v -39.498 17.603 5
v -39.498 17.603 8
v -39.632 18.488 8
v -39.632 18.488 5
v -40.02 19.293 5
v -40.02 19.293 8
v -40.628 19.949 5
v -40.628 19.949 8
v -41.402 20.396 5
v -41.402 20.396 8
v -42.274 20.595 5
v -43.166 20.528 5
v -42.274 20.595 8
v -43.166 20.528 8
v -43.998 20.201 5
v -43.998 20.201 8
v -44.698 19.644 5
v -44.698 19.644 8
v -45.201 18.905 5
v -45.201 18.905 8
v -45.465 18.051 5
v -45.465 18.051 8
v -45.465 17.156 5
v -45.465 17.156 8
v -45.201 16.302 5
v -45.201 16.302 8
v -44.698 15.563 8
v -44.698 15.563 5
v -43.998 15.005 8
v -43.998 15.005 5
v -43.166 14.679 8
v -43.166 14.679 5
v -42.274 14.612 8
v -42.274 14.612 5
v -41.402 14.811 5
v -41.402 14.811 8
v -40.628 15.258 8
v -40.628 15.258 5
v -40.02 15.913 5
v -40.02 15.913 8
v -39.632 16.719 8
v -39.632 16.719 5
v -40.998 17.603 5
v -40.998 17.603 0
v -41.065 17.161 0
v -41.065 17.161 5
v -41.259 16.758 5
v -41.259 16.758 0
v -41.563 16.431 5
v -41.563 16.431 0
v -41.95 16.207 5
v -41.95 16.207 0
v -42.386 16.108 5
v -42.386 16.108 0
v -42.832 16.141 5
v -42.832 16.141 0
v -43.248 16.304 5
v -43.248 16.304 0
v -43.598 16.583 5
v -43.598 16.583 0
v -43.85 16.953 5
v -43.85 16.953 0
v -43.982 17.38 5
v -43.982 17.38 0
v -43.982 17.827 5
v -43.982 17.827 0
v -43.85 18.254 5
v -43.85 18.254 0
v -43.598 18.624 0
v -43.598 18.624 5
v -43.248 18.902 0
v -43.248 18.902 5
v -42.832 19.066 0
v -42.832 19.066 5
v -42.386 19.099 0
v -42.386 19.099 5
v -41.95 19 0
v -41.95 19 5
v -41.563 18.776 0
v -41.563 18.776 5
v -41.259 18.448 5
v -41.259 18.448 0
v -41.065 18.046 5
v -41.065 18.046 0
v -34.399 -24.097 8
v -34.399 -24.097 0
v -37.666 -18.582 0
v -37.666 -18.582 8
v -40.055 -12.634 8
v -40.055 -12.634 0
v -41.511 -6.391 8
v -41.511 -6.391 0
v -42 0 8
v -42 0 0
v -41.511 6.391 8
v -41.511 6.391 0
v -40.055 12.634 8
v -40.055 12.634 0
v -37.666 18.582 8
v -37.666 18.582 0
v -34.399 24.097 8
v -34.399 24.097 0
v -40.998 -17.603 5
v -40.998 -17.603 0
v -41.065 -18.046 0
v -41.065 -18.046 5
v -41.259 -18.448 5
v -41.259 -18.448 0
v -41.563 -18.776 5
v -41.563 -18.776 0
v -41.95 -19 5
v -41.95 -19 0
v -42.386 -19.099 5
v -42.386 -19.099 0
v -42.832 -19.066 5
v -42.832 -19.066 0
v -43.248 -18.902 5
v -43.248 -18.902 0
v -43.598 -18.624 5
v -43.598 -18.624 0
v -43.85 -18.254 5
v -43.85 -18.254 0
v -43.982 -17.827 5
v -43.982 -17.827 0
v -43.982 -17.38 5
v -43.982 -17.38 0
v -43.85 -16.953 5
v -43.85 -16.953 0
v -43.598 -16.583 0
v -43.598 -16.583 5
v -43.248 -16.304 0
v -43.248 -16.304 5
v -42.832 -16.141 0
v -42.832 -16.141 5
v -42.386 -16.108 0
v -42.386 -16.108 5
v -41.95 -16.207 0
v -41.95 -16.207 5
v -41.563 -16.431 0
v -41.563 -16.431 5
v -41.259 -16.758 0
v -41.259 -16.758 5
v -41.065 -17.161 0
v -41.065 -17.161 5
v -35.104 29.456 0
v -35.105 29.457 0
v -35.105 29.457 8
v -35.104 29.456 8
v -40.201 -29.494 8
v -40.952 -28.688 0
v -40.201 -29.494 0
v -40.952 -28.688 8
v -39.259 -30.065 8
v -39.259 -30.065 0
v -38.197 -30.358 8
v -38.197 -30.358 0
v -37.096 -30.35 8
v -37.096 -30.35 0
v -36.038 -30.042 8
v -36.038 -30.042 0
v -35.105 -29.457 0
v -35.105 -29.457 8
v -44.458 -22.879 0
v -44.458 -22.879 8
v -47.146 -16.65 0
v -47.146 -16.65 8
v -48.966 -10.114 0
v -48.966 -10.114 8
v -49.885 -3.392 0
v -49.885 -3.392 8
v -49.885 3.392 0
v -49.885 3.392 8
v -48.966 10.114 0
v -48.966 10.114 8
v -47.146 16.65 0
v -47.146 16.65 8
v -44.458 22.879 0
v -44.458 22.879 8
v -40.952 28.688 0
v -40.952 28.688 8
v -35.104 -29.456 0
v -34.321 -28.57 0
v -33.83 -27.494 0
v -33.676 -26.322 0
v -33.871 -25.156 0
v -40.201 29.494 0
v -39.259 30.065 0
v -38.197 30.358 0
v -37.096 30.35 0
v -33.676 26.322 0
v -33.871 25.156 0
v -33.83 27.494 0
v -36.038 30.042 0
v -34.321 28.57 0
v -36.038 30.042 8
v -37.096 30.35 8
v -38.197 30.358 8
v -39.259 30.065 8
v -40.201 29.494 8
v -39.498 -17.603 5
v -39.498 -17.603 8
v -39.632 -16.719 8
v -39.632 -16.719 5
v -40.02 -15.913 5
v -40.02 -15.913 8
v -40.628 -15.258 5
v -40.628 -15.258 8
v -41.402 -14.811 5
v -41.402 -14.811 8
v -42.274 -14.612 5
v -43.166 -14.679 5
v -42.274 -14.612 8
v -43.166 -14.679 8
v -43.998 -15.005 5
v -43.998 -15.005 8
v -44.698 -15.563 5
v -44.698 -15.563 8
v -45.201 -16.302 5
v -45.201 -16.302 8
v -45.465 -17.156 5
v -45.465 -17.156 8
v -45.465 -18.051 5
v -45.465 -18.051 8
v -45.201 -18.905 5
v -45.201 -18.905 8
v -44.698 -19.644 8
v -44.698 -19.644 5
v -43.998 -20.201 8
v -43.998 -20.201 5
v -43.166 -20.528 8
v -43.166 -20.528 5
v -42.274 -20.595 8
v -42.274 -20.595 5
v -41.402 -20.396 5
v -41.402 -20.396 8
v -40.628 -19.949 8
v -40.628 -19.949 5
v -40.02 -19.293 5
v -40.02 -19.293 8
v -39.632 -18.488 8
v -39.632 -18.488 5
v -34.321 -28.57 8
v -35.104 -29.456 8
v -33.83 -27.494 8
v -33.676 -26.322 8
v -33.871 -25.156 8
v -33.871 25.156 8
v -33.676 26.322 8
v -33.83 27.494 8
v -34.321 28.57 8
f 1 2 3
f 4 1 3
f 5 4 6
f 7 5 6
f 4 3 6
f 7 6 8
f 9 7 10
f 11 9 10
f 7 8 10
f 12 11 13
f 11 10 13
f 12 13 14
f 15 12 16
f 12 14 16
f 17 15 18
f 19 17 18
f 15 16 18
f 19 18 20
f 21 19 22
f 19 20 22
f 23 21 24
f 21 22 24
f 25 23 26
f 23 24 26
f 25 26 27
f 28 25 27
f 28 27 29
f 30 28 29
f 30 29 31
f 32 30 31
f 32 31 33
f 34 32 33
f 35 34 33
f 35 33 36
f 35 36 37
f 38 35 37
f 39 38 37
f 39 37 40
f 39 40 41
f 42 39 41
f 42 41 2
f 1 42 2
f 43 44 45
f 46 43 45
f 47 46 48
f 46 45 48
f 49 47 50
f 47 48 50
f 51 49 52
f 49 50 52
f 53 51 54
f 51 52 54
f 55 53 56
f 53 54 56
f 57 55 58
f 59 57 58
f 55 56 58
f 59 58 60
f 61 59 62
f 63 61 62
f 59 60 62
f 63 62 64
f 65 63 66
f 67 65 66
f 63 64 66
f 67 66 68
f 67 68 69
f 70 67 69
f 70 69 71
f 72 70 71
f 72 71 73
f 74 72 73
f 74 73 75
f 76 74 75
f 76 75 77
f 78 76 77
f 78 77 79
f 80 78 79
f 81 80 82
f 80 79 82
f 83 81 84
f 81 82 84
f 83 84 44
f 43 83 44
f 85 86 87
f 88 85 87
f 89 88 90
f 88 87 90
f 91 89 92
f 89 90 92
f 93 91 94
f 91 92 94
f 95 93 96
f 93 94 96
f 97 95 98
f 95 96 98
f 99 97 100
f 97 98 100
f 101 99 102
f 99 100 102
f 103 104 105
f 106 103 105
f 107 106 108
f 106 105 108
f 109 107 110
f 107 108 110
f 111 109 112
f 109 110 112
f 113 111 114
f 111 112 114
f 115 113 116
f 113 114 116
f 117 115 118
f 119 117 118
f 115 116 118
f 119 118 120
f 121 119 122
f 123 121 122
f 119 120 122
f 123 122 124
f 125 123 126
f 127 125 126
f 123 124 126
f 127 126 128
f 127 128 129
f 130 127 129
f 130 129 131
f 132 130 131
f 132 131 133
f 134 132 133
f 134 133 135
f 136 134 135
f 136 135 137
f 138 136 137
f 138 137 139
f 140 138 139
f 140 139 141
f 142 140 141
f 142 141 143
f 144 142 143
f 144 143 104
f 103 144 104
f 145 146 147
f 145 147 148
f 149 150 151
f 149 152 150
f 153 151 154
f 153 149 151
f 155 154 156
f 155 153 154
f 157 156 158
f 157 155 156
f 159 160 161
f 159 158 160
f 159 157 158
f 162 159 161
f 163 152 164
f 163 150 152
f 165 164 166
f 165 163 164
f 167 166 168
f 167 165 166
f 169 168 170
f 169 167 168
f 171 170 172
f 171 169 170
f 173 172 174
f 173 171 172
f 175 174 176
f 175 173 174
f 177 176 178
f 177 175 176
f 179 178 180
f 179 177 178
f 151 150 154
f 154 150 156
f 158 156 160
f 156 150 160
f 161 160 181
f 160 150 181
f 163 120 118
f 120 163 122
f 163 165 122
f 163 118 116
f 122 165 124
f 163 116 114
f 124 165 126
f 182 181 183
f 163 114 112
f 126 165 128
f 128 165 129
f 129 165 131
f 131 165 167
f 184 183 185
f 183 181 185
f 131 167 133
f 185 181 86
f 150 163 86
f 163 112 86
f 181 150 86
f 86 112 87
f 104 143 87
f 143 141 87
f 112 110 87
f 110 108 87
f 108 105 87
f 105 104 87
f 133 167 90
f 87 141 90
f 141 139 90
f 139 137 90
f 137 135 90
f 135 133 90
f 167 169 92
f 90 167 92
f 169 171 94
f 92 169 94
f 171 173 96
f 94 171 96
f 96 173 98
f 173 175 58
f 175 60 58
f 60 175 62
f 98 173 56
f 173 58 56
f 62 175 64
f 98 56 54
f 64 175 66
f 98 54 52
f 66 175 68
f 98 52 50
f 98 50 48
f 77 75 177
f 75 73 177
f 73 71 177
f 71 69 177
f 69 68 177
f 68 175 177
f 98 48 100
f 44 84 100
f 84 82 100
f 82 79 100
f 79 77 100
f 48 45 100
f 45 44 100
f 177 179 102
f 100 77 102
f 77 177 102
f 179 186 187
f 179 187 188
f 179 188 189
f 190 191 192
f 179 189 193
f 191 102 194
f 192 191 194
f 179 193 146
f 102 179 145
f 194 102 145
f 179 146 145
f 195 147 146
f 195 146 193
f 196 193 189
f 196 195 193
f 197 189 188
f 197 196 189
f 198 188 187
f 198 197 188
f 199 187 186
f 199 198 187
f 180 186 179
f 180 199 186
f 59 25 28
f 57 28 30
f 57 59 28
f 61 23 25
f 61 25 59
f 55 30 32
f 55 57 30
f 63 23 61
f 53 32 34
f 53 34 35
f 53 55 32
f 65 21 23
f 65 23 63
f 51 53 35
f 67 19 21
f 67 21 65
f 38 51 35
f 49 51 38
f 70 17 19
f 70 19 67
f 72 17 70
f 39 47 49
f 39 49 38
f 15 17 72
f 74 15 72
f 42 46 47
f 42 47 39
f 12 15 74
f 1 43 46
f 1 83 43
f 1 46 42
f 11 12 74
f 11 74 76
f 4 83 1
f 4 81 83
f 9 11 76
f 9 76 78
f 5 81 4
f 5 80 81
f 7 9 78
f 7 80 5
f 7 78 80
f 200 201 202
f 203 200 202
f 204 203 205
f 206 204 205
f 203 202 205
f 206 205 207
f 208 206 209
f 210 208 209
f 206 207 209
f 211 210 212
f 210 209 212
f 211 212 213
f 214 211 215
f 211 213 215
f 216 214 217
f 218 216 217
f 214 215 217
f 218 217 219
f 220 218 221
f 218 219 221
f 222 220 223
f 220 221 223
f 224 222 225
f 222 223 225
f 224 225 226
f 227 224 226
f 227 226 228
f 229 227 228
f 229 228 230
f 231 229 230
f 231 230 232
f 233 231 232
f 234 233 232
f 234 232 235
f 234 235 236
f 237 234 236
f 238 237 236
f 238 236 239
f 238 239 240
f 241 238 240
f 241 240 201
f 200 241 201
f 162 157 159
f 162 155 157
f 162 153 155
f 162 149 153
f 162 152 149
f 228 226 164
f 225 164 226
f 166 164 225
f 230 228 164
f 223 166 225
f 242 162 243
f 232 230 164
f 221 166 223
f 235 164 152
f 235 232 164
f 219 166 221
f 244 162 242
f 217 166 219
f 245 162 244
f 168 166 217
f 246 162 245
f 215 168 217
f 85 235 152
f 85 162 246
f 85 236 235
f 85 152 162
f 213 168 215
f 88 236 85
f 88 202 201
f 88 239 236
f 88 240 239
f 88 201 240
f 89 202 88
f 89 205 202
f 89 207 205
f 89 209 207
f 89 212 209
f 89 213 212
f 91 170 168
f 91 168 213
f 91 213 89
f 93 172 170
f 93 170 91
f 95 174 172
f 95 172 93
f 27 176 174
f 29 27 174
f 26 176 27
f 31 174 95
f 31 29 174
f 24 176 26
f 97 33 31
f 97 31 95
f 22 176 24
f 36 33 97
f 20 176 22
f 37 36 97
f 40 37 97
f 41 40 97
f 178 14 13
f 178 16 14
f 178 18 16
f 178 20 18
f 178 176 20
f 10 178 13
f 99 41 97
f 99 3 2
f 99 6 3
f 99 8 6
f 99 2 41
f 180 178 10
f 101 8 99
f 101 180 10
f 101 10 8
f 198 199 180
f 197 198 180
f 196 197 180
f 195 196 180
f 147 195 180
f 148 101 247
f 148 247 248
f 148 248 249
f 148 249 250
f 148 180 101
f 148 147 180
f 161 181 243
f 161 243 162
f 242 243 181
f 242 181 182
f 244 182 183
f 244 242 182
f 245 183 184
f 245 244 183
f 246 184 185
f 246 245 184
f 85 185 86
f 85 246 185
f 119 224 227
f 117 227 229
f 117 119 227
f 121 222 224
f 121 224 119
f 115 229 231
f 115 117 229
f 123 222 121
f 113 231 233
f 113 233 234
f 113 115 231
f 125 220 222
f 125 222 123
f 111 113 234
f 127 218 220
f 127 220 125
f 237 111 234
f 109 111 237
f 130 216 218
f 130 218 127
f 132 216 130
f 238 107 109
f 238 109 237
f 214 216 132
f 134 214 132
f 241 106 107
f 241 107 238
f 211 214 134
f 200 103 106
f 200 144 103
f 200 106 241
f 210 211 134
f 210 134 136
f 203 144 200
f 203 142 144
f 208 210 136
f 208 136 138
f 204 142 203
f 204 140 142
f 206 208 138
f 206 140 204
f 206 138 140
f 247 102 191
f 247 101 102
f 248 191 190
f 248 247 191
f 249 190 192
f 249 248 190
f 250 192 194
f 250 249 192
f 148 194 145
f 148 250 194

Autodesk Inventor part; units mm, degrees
ref_plane "YZ Plane" through (0, 0, 0) normal (1, 0, 0) x (0, 1, 0)
ref_plane "XZ Plane" through (0, 0, 0) normal (0, 1, 0) x (-1, 0, 0)
ref_plane "XY Plane" through (0, 0, 0) normal (0, 0, 1) x (1, 0, 0)
sketch "スケッチ1" plane through (0, 0, 0) normal (0, 0, 1) x (1, 0, 0)
  circle A0 centre (0, 0) radius 46
  circle A1 centre (0, 0) radius 50
  circle A2 centre (0, 0) radius 42
  line L0 (0, 0) -> (0, 54.8528)
  line L1 (0, 0) -> (-20.7697, 50.1426)
  circle A3 centre (-17.6034, 42.4985) radius 1.5
  circle A4 centre (-42.4985, 17.6034) radius 1.5
  circle A5 centre (-42.4985, -17.6034) radius 1.5
  circle A6 centre (-17.6034, -42.4985) radius 1.5
  circle A7 centre (17.6034, -42.4985) radius 1.5
  circle A8 centre (42.4985, -17.6034) radius 1.5
  circle A9 centre (42.4985, 17.6034) radius 1.5
  circle A10 centre (17.6034, 42.4985) radius 1.5
  line L2 (0, 0) -> (-55.1659, -46.2897)
  line L3 (-55.1659, -46.2897) -> (-55.1659, 46.2897)
  line L4 (-55.1659, 46.2897) -> (0, 0)
  line L5 (0, 0) -> (-76.7662, 0)
  point P0 (-32.1739, -26.9971)
  point P1 (-32.1739, 26.9971)
  point P2 (-38.3022, 32.1394)
  point P3 (-38.3022, -32.1394)
  dimension "d0" = 92
  dimension "d1" = 100
  dimension "d2" = 84
  dimension "d3" = 22.5
  dimension "d4" = 3
  dimension "d7" = 360
  dimension "d9" = 80
  dimension "d10" = 40
extrude "押し出し1" add sketch "スケッチ1" along normal blind 8 contours L2 A1 L5 A0 A5 | A0 A5 L5 A2 L2 | A2 L5 A0 A4 L4 | L4 A0 A4 L5 A1
fillet "フィレット1" radius 4 4 edges at (-32.1739, -26.9971, 4) (-38.3022, -32.1394, 4) (-38.3022, 32.1394, 4) (-32.1739, 26.9971, 4)
sketch "スケッチ2" plane through (0, 0, 8) normal (0, 0, 1) x (1, 0, 0)
  circle A0 centre (-42.4985, -17.6034) radius 1.5 projected
  circle A1 centre (-42.4985, -17.6034) radius 3
  circle A2 centre (-42.4985, 17.6034) radius 1.5 projected
  circle A3 centre (-42.4985, 17.6034) radius 3
  point P0 (0, 0)
  dimension "d14" = 6
  dimension "d15" = 6
extrude "押し出し2" cut sketch "スケッチ2" against normal blind 3 contours A0 | A1 | A2 | A3
equation "\"d10\" = 0.5 * d9"
properties part number "legparts_10"
